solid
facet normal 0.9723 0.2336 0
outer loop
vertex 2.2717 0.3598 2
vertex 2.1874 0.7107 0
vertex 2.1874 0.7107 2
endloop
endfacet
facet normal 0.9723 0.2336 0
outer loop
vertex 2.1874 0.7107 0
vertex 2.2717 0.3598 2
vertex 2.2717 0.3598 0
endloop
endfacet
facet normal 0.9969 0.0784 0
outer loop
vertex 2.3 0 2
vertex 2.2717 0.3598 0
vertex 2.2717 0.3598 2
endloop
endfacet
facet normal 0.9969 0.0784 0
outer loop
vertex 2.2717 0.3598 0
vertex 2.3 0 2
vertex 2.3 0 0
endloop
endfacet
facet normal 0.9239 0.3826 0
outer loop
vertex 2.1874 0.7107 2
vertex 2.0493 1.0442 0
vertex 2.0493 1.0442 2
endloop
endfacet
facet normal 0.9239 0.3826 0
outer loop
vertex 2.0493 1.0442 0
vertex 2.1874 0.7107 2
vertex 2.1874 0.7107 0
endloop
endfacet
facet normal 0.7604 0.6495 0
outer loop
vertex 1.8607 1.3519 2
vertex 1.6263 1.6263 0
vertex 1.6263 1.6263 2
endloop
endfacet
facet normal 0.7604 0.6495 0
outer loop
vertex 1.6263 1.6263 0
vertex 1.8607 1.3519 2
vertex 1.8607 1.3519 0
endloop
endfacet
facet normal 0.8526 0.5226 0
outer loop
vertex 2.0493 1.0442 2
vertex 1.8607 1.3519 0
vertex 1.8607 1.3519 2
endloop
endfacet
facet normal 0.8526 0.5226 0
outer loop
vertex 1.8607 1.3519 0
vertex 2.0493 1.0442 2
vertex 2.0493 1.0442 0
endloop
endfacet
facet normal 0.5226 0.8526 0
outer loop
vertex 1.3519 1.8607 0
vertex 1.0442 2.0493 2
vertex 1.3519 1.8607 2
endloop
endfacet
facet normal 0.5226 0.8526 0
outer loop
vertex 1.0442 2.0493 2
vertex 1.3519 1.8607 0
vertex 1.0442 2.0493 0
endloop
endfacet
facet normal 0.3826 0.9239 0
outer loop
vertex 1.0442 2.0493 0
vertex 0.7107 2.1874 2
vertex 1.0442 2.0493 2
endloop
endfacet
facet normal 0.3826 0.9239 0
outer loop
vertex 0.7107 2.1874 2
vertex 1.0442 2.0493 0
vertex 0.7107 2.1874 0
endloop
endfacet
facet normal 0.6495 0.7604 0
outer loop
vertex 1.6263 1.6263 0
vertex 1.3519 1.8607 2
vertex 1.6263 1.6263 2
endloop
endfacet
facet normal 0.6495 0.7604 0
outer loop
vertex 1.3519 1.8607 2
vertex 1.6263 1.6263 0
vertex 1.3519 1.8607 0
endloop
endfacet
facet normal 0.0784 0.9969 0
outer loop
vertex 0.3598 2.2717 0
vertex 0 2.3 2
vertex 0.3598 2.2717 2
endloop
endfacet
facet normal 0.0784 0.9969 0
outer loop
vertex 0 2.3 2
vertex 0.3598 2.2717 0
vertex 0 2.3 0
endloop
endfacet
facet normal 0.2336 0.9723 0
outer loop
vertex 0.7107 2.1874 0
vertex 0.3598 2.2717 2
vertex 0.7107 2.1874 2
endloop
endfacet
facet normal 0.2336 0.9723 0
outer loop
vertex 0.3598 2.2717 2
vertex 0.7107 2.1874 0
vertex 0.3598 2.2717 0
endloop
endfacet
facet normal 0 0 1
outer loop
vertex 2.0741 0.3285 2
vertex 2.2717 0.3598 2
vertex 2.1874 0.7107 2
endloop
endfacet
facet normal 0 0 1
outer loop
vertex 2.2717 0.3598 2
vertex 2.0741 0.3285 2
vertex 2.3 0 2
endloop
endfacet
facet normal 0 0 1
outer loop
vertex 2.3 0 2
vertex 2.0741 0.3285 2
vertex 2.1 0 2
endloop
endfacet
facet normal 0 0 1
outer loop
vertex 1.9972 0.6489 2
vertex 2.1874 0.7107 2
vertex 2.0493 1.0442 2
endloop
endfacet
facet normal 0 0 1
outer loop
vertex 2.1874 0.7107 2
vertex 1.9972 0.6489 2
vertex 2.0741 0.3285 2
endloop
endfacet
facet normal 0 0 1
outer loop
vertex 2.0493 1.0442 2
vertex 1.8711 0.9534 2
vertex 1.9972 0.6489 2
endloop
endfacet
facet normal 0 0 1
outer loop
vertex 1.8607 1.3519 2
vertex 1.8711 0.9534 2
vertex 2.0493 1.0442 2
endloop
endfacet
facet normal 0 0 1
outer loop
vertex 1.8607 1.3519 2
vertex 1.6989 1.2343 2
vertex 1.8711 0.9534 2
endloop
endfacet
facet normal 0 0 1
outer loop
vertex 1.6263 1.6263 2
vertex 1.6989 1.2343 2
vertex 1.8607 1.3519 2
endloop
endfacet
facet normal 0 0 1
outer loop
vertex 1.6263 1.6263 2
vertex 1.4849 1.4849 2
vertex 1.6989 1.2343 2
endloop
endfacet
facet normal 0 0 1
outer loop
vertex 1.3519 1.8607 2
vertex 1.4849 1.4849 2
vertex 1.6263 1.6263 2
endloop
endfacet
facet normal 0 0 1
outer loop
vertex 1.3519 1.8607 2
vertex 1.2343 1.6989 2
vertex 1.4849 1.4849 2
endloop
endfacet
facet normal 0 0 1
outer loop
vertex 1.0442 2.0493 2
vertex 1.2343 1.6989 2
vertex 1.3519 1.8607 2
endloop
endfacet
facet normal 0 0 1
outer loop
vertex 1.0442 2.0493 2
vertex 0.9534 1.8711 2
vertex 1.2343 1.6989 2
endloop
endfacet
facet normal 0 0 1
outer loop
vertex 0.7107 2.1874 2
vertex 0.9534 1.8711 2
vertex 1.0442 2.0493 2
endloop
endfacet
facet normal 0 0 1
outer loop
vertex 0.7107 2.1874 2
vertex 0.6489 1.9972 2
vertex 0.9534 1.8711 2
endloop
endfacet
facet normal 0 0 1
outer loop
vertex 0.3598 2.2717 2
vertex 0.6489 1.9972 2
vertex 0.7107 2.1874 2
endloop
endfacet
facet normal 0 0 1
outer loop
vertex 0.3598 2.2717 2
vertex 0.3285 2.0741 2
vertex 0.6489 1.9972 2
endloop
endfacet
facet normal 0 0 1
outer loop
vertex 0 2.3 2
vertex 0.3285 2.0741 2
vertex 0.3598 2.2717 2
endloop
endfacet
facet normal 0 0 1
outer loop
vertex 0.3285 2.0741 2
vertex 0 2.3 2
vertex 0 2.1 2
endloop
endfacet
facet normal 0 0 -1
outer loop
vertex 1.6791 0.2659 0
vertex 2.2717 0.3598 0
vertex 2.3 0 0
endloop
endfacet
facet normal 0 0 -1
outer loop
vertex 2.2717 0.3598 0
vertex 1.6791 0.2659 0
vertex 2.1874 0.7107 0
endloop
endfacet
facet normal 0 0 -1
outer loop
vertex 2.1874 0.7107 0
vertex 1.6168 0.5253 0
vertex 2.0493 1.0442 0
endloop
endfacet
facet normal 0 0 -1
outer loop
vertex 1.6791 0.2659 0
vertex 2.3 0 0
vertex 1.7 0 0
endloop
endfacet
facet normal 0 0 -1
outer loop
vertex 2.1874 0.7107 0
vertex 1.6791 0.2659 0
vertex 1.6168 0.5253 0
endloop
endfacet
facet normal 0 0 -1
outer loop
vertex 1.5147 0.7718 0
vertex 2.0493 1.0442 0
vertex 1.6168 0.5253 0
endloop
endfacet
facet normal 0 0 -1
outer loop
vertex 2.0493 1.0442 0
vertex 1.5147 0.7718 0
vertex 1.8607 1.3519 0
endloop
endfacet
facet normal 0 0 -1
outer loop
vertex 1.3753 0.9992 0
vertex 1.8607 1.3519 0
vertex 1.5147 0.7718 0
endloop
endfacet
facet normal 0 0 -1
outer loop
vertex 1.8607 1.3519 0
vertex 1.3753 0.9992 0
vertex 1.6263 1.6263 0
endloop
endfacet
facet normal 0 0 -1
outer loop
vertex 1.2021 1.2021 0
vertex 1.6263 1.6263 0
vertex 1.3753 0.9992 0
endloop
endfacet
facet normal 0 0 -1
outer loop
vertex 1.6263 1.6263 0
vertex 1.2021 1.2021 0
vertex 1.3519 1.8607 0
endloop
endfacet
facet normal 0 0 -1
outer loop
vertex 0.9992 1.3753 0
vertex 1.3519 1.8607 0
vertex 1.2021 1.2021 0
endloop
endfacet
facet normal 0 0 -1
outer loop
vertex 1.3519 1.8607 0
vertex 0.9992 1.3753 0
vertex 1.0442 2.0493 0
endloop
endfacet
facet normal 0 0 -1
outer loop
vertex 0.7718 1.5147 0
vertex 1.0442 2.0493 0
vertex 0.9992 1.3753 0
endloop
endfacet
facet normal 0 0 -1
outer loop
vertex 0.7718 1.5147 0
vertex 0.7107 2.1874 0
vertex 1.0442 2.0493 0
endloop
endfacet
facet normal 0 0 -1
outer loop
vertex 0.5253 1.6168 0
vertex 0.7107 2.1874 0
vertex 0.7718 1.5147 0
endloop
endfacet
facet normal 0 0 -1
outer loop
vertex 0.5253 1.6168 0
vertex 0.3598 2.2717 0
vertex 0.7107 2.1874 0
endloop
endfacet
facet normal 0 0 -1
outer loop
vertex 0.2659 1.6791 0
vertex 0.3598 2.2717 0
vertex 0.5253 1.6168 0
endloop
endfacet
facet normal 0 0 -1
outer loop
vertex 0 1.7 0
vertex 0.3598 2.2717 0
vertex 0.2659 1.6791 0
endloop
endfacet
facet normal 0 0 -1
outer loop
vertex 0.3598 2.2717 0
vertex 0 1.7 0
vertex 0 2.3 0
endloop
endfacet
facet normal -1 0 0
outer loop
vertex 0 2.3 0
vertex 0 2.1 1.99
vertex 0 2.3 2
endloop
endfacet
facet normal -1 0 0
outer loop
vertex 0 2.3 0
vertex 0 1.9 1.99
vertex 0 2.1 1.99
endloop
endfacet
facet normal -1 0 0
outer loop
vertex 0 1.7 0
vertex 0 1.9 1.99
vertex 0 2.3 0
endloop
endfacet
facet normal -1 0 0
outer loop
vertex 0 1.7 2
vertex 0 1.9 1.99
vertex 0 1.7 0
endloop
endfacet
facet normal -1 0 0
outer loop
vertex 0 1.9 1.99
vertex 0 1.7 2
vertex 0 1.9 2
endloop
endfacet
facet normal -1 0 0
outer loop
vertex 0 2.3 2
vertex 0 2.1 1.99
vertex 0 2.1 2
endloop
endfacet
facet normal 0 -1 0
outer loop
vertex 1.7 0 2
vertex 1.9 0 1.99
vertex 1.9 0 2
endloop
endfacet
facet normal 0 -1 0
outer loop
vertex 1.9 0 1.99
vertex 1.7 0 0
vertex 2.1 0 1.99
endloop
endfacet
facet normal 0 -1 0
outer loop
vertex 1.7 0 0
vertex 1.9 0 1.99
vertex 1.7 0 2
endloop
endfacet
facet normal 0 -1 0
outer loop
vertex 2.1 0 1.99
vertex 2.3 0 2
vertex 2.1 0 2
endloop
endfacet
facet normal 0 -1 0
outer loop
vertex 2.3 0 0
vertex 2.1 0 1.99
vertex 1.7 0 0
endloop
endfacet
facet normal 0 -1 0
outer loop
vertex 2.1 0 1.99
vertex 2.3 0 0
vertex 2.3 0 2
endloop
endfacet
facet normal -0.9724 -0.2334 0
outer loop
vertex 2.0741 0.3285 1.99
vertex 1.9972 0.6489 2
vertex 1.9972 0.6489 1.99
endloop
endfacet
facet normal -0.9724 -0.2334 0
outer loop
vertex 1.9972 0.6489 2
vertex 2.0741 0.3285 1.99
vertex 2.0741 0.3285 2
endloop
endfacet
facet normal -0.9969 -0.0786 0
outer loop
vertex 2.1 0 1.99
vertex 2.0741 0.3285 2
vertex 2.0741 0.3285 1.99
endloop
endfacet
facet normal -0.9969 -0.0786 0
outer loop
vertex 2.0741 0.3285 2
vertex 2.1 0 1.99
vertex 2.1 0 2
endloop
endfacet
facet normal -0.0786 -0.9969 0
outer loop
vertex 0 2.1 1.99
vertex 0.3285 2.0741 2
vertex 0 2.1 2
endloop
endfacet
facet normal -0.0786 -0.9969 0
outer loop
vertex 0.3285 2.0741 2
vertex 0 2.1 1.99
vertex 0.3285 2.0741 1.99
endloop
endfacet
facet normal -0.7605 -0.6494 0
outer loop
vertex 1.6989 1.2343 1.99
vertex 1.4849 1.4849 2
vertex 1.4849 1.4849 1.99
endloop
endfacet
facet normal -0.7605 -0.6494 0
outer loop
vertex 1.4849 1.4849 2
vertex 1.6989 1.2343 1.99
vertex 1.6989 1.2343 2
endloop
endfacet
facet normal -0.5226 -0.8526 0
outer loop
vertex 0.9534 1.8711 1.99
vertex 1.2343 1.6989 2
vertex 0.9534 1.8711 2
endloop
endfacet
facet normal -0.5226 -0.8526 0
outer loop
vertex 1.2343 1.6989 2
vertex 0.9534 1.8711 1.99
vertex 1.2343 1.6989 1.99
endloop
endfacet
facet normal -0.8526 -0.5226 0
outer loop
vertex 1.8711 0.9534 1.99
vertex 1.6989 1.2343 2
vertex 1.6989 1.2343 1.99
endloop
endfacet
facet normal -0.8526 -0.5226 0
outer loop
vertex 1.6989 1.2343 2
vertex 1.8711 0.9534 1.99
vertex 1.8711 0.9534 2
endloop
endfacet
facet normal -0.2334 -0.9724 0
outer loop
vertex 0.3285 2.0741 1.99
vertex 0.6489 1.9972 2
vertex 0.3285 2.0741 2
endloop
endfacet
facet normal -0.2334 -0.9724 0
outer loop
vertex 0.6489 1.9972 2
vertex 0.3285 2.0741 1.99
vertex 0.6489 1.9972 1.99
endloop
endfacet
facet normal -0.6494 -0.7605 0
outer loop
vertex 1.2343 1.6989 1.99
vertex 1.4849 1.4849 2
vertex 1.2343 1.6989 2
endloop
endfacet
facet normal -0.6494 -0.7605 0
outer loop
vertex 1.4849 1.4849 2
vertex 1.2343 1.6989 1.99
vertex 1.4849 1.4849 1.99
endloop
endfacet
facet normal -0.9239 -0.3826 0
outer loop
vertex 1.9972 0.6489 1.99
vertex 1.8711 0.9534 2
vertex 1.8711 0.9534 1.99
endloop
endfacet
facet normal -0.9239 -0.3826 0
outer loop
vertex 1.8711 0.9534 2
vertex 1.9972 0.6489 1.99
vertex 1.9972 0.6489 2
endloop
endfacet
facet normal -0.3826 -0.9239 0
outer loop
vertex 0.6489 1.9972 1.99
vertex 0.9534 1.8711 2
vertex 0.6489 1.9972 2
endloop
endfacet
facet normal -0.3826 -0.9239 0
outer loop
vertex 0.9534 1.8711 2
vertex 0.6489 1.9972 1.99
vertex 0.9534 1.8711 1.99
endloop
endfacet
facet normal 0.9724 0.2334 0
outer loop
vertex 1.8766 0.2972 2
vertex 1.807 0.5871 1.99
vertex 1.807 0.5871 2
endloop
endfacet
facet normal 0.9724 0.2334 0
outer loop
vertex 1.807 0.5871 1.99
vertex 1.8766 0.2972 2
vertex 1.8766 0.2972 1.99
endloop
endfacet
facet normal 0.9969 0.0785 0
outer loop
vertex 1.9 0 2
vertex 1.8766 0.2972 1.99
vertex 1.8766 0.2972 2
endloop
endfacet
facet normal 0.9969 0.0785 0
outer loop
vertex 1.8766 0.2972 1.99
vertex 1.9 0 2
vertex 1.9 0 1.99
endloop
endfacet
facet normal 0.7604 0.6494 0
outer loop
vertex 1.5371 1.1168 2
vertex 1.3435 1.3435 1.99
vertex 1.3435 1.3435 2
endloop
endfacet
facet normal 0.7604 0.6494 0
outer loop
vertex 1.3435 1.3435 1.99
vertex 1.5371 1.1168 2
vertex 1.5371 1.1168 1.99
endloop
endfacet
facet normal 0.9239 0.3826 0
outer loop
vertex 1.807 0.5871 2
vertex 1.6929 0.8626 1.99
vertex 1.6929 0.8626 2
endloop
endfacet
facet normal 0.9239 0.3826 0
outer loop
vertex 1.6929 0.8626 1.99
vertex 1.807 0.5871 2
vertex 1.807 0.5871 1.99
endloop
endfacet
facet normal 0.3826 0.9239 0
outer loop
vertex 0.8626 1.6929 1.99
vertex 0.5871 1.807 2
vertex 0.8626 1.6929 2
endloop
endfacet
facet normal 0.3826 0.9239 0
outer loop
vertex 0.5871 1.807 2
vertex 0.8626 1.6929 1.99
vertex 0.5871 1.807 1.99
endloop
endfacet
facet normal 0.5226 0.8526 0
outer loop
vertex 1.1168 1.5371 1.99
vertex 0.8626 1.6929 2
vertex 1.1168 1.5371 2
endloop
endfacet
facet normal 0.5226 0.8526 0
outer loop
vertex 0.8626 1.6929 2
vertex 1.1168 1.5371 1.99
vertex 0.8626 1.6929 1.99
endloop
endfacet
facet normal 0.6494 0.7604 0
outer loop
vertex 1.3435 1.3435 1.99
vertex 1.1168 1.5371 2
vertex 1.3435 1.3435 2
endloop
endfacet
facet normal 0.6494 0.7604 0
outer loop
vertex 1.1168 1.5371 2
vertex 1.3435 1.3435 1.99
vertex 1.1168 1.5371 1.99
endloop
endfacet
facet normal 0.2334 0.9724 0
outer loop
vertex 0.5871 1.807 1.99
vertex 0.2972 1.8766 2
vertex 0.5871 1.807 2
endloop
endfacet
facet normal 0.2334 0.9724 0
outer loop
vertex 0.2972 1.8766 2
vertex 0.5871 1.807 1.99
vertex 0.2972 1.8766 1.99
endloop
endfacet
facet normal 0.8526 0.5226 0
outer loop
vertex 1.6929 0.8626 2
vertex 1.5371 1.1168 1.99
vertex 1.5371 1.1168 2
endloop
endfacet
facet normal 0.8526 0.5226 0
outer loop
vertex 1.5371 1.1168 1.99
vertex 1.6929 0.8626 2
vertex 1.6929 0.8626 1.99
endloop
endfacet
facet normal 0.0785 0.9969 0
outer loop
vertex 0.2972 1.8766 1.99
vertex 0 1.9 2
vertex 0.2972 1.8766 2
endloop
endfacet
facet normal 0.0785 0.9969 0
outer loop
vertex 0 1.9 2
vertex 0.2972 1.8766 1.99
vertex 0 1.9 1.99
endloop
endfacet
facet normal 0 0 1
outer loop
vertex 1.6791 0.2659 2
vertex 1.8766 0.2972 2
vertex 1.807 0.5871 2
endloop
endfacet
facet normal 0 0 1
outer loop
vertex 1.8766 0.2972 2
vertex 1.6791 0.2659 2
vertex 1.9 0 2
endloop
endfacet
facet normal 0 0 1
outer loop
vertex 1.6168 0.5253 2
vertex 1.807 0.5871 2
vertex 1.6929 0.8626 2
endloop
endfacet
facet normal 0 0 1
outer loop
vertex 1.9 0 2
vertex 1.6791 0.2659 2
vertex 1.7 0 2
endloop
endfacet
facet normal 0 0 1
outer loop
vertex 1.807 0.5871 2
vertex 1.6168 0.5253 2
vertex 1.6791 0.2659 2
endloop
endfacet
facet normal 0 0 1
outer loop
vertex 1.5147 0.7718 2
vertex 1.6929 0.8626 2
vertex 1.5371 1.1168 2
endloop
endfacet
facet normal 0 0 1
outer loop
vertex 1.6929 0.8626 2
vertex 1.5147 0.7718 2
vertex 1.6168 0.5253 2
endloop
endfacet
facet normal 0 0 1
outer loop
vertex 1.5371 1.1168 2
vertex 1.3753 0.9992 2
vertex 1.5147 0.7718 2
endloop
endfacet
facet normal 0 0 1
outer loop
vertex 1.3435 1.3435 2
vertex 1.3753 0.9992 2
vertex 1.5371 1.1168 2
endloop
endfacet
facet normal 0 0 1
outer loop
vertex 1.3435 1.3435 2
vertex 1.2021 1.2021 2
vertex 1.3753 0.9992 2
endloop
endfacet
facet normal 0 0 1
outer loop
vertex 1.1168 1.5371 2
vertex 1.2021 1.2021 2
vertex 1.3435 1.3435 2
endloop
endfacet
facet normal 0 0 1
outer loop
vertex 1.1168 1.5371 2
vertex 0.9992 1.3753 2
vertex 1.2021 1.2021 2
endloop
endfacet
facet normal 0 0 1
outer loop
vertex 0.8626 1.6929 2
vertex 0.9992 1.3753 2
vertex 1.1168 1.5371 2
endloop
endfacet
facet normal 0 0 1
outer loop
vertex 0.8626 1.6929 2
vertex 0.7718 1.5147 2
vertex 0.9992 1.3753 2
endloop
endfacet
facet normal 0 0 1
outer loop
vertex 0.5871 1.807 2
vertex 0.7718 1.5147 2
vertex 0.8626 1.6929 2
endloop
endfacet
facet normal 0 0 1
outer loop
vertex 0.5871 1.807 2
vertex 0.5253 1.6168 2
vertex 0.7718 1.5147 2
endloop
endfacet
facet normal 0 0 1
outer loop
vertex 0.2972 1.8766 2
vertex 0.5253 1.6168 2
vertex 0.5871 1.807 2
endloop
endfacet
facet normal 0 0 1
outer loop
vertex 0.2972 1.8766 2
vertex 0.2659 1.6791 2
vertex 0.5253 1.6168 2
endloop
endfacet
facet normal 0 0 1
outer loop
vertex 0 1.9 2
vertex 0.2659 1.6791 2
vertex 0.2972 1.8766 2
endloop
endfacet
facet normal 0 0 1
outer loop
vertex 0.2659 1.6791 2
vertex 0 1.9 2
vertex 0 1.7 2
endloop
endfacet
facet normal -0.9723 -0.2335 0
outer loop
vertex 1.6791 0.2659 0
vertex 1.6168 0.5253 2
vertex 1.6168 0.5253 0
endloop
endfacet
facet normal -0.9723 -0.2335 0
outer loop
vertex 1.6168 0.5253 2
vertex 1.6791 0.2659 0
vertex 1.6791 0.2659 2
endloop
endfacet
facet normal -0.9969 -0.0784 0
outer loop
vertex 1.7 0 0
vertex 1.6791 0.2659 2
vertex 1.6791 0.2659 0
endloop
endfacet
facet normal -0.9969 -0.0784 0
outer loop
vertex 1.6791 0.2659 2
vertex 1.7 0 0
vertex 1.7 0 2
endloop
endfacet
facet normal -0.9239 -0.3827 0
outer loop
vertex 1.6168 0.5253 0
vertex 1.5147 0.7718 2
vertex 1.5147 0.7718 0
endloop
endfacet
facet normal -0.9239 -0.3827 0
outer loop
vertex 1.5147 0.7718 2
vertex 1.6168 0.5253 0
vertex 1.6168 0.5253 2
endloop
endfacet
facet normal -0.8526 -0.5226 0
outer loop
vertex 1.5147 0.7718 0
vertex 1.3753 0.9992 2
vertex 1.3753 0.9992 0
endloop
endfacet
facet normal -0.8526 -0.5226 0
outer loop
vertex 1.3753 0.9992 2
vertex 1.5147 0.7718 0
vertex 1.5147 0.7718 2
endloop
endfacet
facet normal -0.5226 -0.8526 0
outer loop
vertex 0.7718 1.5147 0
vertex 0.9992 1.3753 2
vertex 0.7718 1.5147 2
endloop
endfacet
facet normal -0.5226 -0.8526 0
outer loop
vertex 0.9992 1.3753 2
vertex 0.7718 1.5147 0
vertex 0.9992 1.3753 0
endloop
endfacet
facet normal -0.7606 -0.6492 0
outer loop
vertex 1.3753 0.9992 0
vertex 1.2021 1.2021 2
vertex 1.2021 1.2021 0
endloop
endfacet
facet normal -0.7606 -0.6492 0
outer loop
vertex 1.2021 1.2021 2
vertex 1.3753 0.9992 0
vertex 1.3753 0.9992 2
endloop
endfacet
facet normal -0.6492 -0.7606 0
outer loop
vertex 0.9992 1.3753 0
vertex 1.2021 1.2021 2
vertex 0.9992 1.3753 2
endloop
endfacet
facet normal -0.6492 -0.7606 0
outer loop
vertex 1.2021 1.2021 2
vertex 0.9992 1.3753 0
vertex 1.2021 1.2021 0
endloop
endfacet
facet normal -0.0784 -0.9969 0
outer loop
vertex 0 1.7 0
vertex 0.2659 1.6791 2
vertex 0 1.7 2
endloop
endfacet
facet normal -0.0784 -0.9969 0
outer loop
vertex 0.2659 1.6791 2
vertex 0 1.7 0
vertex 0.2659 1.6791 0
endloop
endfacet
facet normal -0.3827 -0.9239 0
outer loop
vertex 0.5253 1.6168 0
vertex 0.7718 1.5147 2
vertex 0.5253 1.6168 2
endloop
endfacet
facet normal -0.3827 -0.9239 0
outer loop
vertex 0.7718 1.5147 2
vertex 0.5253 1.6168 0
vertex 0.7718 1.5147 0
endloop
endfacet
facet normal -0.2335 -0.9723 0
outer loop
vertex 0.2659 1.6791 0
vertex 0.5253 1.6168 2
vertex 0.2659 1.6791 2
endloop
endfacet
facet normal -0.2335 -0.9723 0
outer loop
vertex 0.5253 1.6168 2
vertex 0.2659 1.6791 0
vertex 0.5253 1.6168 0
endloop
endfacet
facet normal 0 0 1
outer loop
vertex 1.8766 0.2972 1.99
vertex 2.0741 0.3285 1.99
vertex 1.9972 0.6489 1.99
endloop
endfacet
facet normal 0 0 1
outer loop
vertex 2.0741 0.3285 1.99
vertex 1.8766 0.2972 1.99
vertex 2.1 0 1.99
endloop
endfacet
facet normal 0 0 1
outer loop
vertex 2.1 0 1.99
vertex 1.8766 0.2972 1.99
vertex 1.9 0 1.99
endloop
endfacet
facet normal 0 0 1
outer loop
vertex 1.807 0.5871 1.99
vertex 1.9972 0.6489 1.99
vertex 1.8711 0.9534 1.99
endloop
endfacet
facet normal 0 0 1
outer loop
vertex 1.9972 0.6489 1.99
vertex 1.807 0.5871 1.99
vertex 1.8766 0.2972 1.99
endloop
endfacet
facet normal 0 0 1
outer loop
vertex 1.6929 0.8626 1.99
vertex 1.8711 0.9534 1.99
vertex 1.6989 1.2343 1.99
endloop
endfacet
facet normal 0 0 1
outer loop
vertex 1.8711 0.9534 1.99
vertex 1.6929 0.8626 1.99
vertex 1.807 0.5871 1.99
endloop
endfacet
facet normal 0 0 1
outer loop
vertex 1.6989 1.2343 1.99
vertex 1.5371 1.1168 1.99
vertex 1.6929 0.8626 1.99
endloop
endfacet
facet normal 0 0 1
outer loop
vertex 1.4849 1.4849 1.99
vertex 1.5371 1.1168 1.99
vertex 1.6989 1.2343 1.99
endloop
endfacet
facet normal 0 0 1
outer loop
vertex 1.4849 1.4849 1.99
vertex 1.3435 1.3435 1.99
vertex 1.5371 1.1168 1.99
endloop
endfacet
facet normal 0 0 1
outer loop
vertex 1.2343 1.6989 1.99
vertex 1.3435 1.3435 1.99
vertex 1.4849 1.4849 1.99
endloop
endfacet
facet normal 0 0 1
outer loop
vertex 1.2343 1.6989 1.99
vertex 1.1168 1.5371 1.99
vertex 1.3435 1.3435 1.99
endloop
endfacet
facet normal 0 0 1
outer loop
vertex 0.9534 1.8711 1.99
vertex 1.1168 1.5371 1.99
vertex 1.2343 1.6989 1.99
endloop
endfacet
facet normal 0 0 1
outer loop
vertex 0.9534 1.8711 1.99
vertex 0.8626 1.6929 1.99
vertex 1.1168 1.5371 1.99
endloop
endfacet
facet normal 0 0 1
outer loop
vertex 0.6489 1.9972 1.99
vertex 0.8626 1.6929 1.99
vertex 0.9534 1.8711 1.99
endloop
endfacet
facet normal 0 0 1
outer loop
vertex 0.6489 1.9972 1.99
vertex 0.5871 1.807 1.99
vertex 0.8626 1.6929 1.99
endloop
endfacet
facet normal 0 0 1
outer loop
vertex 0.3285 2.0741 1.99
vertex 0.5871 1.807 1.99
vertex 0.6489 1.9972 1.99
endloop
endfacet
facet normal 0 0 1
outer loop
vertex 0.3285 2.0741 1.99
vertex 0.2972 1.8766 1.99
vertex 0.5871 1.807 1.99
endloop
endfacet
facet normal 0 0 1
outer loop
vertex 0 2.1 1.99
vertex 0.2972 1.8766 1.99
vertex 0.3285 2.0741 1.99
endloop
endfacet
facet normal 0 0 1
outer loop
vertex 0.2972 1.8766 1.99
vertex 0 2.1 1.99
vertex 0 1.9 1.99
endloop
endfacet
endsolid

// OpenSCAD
module Wall_03(rot = 0){

module Wall_Curve(){
    rotate([0,0,rot * 90]){
    color("white")
    translate([0,0,0])

    difference(){
        intersection(){
            cylinder(3.98,2.1,2.1, $fn=40, center = true);
            cube([3,3,3]);
        }
    
        rotate([0,0,0])
        cylinder(5,1.9,1.9, center= true, $fn=40);
    }
    }

    }
    
    
    rotate([0,0,rot * 90]){
    color("blue")
    translate([0,0,0])

    difference(){
        intersection(){
            cylinder(4,2.3,2.3, $fn=40, center = true);
            cube([3,3,3]);
        }
    
        rotate([0,0,0])
        cylinder(5,2.1,2.1, center= true, $fn=40);
    }
    }
    
    
    rotate([0,0,rot * 90]){
    color("green")
    translate([0,0,0])

    difference(){
        intersection(){
            cylinder(4,1.9,1.9, $fn=40, center = true);
            cube([4,3,3]);
        }
    
        rotate([0,0,0])
        cylinder(6,1.7,1.7, center= true, $fn=40);
    }
    }
    
    
   
    
    Wall_Curve();
 
 
   
}


Wall_03(rot =0);
